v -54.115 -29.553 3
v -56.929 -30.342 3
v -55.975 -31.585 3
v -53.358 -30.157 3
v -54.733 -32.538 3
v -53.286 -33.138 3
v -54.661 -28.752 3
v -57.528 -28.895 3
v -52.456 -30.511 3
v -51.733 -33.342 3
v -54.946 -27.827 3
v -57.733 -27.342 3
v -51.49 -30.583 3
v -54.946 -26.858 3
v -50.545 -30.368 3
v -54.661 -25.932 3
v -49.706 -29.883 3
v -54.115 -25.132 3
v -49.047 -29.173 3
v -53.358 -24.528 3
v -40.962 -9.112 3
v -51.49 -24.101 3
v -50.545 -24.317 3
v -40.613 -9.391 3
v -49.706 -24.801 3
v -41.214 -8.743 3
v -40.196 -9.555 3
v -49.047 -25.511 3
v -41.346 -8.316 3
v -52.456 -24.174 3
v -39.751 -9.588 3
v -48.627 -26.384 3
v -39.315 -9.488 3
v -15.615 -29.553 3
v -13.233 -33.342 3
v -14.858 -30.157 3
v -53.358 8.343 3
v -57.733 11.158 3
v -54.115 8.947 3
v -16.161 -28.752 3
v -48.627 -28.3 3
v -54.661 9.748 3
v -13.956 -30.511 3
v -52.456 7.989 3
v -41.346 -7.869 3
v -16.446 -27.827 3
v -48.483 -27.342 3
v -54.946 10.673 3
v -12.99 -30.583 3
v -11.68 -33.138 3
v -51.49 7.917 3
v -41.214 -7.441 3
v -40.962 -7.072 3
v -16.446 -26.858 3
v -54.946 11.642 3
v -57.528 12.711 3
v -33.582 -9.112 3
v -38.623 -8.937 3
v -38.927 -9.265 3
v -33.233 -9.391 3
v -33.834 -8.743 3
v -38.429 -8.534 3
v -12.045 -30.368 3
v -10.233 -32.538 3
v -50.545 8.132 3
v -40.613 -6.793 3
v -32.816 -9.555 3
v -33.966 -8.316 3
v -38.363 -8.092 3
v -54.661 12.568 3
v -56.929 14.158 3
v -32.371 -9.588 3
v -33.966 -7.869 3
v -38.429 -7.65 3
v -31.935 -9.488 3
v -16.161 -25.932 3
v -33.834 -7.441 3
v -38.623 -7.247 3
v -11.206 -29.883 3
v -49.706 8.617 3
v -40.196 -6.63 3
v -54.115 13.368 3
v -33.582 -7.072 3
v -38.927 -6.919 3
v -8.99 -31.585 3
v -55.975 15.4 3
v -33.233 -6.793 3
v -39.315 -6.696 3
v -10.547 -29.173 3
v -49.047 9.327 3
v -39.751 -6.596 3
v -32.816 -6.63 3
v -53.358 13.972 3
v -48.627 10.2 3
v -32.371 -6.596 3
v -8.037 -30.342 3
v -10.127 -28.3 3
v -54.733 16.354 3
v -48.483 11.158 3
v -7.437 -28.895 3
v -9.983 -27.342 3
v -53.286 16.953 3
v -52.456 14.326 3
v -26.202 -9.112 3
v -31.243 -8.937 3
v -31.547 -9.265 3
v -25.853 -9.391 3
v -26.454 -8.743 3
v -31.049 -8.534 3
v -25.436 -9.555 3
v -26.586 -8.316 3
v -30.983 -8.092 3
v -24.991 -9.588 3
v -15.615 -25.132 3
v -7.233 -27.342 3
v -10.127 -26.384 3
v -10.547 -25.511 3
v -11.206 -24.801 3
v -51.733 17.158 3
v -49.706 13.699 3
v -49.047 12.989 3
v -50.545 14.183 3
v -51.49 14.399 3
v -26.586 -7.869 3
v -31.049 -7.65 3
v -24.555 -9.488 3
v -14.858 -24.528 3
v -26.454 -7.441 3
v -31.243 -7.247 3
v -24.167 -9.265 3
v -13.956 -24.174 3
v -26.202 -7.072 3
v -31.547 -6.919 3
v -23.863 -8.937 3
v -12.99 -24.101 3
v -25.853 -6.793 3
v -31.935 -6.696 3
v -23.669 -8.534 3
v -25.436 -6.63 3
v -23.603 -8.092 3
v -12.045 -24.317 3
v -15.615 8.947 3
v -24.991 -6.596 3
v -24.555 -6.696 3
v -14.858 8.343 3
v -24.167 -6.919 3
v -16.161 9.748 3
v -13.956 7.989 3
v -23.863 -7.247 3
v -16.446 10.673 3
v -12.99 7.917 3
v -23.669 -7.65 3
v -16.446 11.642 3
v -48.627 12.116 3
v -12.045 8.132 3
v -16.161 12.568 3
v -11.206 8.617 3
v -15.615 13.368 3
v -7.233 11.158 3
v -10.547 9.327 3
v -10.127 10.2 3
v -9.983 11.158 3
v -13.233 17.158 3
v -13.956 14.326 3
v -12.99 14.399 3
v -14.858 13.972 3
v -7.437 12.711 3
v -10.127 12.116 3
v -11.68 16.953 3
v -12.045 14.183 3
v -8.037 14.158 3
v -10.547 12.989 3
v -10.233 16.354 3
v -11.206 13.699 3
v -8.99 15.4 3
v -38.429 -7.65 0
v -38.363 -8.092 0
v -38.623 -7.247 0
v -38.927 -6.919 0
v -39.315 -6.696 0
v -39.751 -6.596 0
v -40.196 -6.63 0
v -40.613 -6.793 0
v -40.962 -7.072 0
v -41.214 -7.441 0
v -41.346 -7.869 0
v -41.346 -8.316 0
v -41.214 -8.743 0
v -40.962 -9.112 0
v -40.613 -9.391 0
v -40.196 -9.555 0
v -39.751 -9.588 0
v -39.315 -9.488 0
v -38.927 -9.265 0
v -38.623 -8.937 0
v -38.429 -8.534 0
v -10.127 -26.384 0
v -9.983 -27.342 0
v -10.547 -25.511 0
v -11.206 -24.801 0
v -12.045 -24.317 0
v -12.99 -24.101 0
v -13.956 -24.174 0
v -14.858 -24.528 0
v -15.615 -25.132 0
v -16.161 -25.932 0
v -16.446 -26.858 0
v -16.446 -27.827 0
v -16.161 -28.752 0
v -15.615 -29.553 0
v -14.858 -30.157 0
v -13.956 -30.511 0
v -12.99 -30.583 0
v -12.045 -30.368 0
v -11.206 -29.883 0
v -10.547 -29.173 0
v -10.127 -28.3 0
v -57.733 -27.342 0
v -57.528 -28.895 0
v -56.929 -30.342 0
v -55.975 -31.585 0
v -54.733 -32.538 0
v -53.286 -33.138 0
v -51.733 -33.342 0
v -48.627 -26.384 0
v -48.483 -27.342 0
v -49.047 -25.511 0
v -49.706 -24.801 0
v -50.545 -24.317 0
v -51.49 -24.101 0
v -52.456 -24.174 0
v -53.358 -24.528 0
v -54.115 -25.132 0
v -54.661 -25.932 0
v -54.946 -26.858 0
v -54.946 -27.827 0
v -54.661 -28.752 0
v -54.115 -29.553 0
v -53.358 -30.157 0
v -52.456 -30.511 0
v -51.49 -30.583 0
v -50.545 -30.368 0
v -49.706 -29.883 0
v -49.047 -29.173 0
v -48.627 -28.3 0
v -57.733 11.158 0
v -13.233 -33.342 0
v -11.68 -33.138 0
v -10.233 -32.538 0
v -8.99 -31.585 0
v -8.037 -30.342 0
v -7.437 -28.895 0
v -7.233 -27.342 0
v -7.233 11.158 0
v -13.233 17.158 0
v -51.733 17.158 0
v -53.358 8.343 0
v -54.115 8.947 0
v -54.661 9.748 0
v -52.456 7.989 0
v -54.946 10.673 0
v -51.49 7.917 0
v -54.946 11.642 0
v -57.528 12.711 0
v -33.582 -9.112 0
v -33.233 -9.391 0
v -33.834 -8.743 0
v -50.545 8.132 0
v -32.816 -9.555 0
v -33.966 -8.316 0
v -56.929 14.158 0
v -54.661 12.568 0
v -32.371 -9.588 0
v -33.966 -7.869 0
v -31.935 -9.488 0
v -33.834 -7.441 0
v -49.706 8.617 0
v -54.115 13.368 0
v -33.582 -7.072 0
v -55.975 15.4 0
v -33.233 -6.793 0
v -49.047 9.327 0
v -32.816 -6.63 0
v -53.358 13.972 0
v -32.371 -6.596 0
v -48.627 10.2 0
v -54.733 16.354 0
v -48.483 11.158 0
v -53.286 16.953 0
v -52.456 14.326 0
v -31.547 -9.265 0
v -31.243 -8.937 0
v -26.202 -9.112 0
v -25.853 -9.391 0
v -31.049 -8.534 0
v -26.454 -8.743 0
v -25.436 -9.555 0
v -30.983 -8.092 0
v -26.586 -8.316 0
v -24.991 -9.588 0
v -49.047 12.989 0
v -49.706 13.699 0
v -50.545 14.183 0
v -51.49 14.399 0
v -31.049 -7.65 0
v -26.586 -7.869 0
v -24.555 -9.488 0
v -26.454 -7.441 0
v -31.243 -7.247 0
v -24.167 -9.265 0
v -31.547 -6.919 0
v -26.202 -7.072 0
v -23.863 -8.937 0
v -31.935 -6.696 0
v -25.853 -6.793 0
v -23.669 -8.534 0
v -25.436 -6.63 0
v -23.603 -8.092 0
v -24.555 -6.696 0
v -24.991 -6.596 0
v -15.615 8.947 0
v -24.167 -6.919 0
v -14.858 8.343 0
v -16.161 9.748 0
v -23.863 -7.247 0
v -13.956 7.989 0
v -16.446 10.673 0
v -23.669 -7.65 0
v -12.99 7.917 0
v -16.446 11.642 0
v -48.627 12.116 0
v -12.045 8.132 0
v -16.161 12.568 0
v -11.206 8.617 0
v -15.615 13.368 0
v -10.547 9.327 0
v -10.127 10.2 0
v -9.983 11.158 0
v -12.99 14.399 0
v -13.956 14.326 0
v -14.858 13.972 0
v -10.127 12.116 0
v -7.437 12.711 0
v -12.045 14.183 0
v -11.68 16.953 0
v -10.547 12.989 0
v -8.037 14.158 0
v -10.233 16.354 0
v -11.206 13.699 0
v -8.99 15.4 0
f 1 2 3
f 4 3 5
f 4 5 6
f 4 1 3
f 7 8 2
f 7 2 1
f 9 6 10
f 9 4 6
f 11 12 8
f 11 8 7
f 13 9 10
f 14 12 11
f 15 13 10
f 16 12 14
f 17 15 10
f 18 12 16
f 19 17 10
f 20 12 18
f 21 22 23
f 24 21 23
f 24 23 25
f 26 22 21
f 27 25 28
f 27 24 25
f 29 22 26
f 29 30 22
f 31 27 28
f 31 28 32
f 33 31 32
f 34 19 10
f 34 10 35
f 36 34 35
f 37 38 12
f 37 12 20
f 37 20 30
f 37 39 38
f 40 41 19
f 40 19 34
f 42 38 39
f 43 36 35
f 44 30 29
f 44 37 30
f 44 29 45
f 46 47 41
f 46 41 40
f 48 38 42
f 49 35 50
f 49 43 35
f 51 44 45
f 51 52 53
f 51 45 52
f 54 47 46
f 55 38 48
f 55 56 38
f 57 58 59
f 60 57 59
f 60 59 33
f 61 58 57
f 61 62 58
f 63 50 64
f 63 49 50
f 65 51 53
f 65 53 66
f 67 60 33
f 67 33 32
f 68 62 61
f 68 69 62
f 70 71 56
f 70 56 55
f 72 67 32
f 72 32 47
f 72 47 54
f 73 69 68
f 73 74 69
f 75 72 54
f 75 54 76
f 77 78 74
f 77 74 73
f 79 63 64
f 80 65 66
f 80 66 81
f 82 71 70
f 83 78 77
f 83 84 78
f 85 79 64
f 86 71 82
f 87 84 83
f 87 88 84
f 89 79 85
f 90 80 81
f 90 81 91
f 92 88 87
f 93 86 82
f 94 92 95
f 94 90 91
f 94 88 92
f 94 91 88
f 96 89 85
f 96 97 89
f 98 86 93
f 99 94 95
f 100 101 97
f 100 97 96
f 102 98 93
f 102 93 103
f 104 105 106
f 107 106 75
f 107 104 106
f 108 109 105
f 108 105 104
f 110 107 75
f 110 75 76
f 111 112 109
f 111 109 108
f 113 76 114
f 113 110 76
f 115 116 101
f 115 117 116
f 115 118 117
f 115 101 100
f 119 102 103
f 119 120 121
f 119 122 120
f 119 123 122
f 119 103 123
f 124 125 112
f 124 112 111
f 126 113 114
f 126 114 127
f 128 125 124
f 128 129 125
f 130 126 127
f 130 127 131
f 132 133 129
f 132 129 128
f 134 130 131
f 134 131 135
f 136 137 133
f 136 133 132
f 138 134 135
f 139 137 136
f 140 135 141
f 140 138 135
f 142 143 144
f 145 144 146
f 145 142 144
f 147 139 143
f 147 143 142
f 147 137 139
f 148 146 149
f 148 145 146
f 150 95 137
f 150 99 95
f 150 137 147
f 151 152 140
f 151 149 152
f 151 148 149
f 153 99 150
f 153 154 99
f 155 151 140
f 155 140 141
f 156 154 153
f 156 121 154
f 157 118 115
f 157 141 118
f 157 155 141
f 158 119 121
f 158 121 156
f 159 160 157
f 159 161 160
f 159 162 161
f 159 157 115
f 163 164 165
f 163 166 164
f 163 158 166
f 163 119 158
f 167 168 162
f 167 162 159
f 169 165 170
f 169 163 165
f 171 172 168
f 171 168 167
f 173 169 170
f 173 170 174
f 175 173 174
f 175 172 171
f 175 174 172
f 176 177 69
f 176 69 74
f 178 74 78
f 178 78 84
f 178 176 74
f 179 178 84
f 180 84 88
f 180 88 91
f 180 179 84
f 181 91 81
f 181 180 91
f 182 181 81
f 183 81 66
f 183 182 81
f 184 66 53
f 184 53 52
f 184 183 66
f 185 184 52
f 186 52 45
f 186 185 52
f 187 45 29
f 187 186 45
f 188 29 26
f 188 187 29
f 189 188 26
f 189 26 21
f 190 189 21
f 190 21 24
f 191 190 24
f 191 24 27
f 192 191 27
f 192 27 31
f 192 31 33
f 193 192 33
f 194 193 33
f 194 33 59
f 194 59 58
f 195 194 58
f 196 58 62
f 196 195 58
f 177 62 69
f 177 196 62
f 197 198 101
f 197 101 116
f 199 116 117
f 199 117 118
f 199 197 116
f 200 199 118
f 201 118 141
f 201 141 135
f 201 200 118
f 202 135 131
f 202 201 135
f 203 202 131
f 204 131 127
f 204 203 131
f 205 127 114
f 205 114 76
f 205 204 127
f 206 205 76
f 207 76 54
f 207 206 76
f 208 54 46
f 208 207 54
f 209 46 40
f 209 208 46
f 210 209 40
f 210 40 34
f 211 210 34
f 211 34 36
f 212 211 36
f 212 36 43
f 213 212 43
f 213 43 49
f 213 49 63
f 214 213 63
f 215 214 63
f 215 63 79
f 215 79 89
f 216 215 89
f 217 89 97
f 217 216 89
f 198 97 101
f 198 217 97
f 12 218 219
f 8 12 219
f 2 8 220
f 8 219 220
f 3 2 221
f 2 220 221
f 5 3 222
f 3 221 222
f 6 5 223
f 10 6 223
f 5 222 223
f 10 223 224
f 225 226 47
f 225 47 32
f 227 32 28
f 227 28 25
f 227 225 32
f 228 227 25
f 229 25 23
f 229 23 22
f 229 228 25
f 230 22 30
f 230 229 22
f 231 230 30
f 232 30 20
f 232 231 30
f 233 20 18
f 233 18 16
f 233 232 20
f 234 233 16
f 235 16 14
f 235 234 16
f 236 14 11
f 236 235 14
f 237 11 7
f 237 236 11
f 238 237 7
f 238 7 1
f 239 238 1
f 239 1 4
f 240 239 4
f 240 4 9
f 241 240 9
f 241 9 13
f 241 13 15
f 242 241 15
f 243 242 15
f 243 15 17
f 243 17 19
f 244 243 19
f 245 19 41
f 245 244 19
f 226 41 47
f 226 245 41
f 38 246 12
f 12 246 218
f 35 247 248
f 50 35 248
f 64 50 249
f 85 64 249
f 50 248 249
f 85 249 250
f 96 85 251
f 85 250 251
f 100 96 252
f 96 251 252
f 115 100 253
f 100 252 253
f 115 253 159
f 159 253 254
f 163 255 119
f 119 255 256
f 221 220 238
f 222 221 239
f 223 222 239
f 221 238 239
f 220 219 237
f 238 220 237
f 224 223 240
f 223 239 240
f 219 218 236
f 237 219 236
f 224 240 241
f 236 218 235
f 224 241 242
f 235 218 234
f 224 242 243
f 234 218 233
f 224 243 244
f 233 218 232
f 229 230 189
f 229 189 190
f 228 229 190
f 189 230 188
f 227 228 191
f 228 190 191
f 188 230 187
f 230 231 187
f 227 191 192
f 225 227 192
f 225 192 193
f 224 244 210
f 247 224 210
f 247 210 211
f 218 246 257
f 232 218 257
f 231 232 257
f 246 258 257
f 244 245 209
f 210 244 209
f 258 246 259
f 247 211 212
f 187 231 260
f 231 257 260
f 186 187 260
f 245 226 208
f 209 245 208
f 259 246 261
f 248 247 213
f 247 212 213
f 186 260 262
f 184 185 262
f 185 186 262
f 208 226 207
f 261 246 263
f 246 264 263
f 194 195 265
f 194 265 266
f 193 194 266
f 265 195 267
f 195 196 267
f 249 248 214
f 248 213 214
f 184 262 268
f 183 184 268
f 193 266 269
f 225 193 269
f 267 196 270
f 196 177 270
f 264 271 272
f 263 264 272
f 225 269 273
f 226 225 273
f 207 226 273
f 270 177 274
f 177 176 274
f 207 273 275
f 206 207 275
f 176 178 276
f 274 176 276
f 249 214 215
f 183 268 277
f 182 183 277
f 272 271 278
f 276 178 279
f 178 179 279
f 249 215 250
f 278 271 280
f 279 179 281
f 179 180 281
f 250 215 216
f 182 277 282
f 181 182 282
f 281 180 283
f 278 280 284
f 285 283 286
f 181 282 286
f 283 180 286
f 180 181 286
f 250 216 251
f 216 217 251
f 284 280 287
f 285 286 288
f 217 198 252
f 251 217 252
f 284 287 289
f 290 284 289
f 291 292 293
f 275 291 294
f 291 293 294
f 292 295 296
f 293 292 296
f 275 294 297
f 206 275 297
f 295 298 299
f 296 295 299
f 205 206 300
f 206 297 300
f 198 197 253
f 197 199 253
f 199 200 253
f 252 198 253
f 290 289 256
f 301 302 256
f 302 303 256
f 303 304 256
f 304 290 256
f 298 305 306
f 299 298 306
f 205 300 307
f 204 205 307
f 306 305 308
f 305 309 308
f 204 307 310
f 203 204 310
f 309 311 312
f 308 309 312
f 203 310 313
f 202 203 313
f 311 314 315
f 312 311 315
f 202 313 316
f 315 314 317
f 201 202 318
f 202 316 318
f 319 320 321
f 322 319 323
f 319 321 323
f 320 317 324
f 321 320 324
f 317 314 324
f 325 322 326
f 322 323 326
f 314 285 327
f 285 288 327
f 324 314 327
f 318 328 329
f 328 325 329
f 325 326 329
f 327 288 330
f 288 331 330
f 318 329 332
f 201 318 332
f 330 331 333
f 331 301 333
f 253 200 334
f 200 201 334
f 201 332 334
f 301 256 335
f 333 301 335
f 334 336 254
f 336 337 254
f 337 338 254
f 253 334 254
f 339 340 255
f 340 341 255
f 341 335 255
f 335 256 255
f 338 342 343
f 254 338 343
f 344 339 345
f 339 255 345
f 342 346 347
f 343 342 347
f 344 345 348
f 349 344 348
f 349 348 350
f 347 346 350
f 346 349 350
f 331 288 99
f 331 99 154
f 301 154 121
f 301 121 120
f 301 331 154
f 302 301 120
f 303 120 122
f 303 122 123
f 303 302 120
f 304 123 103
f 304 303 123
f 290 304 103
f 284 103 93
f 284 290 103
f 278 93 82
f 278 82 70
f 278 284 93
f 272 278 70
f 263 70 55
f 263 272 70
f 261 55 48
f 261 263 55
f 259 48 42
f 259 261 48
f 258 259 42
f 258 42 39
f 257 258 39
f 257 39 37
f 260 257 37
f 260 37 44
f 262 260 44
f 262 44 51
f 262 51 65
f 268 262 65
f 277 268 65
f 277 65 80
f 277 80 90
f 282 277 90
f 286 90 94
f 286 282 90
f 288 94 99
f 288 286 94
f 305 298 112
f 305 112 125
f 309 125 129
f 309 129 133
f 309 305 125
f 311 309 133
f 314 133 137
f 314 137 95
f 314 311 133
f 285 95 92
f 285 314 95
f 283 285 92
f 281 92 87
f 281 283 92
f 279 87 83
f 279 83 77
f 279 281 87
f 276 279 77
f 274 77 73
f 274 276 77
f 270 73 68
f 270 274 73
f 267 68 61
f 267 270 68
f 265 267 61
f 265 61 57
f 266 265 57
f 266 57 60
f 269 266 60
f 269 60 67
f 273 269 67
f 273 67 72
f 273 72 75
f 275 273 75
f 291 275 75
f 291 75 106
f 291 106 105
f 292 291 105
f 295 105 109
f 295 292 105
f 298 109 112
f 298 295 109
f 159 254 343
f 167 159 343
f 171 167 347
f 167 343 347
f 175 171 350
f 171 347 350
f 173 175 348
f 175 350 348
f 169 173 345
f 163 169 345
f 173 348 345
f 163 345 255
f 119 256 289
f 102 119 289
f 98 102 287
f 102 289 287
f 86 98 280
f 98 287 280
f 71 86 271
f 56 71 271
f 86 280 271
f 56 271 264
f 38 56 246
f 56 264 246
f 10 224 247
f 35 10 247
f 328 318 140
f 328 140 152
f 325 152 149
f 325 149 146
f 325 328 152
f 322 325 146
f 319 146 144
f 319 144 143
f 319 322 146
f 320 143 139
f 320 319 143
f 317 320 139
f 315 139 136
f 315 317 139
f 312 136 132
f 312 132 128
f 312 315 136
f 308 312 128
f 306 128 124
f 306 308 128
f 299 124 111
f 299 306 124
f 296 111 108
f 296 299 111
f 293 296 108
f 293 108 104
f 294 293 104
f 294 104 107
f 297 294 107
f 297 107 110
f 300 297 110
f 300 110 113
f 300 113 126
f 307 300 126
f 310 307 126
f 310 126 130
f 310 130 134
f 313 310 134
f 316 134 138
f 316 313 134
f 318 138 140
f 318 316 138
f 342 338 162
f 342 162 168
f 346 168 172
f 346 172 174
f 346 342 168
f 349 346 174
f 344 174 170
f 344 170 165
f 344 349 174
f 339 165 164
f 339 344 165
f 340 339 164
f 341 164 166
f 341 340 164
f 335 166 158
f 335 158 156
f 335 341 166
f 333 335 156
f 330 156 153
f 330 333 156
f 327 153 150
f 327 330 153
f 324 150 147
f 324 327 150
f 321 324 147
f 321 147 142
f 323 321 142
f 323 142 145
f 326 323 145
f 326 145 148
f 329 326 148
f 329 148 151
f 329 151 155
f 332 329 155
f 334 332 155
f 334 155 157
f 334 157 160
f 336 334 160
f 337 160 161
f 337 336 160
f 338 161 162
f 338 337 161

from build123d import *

# Parameters (mm, degrees)
F0_R     = 3.25
F0_R_2   = 1.5
F1_DEPTH = 3


with BuildPart() as f1:
    # F0 (on Top) → F1 (new body)
    with BuildSketch(Plane.XY):
        with BuildLine():
            Line((-13.232693, 17.157822), (-51.732693, 17.157822))
            ThreePointArc((-51.732693, 17.157822), (-55.975334, 15.400463), (-57.732693, 11.157822))
            Line((-57.732693, 11.157822), (-57.732693, -27.342178))
            ThreePointArc((-57.732693, -27.342178), (-55.975334, -31.584819), (-51.732693, -33.342178))
            Line((-51.732693, -33.342178), (-13.232693, -33.342178))
            ThreePointArc((-13.232693, -33.342178), (-8.990052, -31.584819), (-7.232693, -27.342178))
            Line((-7.232693, -27.342178), (-7.232693, 11.157822))
            ThreePointArc((-7.232693, 11.157822), (-8.990052, 15.400463), (-13.232693, 17.157822))
        make_face()
        with Locations((-51.732693, -27.342178)):
            Circle(F0_R, mode=Mode.SUBTRACT)
        with Locations((-39.862693, -8.092178)):
            Circle(F0_R_2, mode=Mode.SUBTRACT)
        with Locations((-32.482693, -8.092178)):
            Circle(F0_R_2, mode=Mode.SUBTRACT)
        with Locations((-13.232693, -27.342178)):
            Circle(F0_R, mode=Mode.SUBTRACT)
        with Locations((-25.102693, -8.092178)):
            Circle(F0_R_2, mode=Mode.SUBTRACT)
        with Locations((-51.732693, 11.157822)):
            Circle(F0_R, mode=Mode.SUBTRACT)
        with Locations((-13.232693, 11.157822)):
            Circle(F0_R, mode=Mode.SUBTRACT)
    extrude(amount=F1_DEPTH)


solid = f1.part
